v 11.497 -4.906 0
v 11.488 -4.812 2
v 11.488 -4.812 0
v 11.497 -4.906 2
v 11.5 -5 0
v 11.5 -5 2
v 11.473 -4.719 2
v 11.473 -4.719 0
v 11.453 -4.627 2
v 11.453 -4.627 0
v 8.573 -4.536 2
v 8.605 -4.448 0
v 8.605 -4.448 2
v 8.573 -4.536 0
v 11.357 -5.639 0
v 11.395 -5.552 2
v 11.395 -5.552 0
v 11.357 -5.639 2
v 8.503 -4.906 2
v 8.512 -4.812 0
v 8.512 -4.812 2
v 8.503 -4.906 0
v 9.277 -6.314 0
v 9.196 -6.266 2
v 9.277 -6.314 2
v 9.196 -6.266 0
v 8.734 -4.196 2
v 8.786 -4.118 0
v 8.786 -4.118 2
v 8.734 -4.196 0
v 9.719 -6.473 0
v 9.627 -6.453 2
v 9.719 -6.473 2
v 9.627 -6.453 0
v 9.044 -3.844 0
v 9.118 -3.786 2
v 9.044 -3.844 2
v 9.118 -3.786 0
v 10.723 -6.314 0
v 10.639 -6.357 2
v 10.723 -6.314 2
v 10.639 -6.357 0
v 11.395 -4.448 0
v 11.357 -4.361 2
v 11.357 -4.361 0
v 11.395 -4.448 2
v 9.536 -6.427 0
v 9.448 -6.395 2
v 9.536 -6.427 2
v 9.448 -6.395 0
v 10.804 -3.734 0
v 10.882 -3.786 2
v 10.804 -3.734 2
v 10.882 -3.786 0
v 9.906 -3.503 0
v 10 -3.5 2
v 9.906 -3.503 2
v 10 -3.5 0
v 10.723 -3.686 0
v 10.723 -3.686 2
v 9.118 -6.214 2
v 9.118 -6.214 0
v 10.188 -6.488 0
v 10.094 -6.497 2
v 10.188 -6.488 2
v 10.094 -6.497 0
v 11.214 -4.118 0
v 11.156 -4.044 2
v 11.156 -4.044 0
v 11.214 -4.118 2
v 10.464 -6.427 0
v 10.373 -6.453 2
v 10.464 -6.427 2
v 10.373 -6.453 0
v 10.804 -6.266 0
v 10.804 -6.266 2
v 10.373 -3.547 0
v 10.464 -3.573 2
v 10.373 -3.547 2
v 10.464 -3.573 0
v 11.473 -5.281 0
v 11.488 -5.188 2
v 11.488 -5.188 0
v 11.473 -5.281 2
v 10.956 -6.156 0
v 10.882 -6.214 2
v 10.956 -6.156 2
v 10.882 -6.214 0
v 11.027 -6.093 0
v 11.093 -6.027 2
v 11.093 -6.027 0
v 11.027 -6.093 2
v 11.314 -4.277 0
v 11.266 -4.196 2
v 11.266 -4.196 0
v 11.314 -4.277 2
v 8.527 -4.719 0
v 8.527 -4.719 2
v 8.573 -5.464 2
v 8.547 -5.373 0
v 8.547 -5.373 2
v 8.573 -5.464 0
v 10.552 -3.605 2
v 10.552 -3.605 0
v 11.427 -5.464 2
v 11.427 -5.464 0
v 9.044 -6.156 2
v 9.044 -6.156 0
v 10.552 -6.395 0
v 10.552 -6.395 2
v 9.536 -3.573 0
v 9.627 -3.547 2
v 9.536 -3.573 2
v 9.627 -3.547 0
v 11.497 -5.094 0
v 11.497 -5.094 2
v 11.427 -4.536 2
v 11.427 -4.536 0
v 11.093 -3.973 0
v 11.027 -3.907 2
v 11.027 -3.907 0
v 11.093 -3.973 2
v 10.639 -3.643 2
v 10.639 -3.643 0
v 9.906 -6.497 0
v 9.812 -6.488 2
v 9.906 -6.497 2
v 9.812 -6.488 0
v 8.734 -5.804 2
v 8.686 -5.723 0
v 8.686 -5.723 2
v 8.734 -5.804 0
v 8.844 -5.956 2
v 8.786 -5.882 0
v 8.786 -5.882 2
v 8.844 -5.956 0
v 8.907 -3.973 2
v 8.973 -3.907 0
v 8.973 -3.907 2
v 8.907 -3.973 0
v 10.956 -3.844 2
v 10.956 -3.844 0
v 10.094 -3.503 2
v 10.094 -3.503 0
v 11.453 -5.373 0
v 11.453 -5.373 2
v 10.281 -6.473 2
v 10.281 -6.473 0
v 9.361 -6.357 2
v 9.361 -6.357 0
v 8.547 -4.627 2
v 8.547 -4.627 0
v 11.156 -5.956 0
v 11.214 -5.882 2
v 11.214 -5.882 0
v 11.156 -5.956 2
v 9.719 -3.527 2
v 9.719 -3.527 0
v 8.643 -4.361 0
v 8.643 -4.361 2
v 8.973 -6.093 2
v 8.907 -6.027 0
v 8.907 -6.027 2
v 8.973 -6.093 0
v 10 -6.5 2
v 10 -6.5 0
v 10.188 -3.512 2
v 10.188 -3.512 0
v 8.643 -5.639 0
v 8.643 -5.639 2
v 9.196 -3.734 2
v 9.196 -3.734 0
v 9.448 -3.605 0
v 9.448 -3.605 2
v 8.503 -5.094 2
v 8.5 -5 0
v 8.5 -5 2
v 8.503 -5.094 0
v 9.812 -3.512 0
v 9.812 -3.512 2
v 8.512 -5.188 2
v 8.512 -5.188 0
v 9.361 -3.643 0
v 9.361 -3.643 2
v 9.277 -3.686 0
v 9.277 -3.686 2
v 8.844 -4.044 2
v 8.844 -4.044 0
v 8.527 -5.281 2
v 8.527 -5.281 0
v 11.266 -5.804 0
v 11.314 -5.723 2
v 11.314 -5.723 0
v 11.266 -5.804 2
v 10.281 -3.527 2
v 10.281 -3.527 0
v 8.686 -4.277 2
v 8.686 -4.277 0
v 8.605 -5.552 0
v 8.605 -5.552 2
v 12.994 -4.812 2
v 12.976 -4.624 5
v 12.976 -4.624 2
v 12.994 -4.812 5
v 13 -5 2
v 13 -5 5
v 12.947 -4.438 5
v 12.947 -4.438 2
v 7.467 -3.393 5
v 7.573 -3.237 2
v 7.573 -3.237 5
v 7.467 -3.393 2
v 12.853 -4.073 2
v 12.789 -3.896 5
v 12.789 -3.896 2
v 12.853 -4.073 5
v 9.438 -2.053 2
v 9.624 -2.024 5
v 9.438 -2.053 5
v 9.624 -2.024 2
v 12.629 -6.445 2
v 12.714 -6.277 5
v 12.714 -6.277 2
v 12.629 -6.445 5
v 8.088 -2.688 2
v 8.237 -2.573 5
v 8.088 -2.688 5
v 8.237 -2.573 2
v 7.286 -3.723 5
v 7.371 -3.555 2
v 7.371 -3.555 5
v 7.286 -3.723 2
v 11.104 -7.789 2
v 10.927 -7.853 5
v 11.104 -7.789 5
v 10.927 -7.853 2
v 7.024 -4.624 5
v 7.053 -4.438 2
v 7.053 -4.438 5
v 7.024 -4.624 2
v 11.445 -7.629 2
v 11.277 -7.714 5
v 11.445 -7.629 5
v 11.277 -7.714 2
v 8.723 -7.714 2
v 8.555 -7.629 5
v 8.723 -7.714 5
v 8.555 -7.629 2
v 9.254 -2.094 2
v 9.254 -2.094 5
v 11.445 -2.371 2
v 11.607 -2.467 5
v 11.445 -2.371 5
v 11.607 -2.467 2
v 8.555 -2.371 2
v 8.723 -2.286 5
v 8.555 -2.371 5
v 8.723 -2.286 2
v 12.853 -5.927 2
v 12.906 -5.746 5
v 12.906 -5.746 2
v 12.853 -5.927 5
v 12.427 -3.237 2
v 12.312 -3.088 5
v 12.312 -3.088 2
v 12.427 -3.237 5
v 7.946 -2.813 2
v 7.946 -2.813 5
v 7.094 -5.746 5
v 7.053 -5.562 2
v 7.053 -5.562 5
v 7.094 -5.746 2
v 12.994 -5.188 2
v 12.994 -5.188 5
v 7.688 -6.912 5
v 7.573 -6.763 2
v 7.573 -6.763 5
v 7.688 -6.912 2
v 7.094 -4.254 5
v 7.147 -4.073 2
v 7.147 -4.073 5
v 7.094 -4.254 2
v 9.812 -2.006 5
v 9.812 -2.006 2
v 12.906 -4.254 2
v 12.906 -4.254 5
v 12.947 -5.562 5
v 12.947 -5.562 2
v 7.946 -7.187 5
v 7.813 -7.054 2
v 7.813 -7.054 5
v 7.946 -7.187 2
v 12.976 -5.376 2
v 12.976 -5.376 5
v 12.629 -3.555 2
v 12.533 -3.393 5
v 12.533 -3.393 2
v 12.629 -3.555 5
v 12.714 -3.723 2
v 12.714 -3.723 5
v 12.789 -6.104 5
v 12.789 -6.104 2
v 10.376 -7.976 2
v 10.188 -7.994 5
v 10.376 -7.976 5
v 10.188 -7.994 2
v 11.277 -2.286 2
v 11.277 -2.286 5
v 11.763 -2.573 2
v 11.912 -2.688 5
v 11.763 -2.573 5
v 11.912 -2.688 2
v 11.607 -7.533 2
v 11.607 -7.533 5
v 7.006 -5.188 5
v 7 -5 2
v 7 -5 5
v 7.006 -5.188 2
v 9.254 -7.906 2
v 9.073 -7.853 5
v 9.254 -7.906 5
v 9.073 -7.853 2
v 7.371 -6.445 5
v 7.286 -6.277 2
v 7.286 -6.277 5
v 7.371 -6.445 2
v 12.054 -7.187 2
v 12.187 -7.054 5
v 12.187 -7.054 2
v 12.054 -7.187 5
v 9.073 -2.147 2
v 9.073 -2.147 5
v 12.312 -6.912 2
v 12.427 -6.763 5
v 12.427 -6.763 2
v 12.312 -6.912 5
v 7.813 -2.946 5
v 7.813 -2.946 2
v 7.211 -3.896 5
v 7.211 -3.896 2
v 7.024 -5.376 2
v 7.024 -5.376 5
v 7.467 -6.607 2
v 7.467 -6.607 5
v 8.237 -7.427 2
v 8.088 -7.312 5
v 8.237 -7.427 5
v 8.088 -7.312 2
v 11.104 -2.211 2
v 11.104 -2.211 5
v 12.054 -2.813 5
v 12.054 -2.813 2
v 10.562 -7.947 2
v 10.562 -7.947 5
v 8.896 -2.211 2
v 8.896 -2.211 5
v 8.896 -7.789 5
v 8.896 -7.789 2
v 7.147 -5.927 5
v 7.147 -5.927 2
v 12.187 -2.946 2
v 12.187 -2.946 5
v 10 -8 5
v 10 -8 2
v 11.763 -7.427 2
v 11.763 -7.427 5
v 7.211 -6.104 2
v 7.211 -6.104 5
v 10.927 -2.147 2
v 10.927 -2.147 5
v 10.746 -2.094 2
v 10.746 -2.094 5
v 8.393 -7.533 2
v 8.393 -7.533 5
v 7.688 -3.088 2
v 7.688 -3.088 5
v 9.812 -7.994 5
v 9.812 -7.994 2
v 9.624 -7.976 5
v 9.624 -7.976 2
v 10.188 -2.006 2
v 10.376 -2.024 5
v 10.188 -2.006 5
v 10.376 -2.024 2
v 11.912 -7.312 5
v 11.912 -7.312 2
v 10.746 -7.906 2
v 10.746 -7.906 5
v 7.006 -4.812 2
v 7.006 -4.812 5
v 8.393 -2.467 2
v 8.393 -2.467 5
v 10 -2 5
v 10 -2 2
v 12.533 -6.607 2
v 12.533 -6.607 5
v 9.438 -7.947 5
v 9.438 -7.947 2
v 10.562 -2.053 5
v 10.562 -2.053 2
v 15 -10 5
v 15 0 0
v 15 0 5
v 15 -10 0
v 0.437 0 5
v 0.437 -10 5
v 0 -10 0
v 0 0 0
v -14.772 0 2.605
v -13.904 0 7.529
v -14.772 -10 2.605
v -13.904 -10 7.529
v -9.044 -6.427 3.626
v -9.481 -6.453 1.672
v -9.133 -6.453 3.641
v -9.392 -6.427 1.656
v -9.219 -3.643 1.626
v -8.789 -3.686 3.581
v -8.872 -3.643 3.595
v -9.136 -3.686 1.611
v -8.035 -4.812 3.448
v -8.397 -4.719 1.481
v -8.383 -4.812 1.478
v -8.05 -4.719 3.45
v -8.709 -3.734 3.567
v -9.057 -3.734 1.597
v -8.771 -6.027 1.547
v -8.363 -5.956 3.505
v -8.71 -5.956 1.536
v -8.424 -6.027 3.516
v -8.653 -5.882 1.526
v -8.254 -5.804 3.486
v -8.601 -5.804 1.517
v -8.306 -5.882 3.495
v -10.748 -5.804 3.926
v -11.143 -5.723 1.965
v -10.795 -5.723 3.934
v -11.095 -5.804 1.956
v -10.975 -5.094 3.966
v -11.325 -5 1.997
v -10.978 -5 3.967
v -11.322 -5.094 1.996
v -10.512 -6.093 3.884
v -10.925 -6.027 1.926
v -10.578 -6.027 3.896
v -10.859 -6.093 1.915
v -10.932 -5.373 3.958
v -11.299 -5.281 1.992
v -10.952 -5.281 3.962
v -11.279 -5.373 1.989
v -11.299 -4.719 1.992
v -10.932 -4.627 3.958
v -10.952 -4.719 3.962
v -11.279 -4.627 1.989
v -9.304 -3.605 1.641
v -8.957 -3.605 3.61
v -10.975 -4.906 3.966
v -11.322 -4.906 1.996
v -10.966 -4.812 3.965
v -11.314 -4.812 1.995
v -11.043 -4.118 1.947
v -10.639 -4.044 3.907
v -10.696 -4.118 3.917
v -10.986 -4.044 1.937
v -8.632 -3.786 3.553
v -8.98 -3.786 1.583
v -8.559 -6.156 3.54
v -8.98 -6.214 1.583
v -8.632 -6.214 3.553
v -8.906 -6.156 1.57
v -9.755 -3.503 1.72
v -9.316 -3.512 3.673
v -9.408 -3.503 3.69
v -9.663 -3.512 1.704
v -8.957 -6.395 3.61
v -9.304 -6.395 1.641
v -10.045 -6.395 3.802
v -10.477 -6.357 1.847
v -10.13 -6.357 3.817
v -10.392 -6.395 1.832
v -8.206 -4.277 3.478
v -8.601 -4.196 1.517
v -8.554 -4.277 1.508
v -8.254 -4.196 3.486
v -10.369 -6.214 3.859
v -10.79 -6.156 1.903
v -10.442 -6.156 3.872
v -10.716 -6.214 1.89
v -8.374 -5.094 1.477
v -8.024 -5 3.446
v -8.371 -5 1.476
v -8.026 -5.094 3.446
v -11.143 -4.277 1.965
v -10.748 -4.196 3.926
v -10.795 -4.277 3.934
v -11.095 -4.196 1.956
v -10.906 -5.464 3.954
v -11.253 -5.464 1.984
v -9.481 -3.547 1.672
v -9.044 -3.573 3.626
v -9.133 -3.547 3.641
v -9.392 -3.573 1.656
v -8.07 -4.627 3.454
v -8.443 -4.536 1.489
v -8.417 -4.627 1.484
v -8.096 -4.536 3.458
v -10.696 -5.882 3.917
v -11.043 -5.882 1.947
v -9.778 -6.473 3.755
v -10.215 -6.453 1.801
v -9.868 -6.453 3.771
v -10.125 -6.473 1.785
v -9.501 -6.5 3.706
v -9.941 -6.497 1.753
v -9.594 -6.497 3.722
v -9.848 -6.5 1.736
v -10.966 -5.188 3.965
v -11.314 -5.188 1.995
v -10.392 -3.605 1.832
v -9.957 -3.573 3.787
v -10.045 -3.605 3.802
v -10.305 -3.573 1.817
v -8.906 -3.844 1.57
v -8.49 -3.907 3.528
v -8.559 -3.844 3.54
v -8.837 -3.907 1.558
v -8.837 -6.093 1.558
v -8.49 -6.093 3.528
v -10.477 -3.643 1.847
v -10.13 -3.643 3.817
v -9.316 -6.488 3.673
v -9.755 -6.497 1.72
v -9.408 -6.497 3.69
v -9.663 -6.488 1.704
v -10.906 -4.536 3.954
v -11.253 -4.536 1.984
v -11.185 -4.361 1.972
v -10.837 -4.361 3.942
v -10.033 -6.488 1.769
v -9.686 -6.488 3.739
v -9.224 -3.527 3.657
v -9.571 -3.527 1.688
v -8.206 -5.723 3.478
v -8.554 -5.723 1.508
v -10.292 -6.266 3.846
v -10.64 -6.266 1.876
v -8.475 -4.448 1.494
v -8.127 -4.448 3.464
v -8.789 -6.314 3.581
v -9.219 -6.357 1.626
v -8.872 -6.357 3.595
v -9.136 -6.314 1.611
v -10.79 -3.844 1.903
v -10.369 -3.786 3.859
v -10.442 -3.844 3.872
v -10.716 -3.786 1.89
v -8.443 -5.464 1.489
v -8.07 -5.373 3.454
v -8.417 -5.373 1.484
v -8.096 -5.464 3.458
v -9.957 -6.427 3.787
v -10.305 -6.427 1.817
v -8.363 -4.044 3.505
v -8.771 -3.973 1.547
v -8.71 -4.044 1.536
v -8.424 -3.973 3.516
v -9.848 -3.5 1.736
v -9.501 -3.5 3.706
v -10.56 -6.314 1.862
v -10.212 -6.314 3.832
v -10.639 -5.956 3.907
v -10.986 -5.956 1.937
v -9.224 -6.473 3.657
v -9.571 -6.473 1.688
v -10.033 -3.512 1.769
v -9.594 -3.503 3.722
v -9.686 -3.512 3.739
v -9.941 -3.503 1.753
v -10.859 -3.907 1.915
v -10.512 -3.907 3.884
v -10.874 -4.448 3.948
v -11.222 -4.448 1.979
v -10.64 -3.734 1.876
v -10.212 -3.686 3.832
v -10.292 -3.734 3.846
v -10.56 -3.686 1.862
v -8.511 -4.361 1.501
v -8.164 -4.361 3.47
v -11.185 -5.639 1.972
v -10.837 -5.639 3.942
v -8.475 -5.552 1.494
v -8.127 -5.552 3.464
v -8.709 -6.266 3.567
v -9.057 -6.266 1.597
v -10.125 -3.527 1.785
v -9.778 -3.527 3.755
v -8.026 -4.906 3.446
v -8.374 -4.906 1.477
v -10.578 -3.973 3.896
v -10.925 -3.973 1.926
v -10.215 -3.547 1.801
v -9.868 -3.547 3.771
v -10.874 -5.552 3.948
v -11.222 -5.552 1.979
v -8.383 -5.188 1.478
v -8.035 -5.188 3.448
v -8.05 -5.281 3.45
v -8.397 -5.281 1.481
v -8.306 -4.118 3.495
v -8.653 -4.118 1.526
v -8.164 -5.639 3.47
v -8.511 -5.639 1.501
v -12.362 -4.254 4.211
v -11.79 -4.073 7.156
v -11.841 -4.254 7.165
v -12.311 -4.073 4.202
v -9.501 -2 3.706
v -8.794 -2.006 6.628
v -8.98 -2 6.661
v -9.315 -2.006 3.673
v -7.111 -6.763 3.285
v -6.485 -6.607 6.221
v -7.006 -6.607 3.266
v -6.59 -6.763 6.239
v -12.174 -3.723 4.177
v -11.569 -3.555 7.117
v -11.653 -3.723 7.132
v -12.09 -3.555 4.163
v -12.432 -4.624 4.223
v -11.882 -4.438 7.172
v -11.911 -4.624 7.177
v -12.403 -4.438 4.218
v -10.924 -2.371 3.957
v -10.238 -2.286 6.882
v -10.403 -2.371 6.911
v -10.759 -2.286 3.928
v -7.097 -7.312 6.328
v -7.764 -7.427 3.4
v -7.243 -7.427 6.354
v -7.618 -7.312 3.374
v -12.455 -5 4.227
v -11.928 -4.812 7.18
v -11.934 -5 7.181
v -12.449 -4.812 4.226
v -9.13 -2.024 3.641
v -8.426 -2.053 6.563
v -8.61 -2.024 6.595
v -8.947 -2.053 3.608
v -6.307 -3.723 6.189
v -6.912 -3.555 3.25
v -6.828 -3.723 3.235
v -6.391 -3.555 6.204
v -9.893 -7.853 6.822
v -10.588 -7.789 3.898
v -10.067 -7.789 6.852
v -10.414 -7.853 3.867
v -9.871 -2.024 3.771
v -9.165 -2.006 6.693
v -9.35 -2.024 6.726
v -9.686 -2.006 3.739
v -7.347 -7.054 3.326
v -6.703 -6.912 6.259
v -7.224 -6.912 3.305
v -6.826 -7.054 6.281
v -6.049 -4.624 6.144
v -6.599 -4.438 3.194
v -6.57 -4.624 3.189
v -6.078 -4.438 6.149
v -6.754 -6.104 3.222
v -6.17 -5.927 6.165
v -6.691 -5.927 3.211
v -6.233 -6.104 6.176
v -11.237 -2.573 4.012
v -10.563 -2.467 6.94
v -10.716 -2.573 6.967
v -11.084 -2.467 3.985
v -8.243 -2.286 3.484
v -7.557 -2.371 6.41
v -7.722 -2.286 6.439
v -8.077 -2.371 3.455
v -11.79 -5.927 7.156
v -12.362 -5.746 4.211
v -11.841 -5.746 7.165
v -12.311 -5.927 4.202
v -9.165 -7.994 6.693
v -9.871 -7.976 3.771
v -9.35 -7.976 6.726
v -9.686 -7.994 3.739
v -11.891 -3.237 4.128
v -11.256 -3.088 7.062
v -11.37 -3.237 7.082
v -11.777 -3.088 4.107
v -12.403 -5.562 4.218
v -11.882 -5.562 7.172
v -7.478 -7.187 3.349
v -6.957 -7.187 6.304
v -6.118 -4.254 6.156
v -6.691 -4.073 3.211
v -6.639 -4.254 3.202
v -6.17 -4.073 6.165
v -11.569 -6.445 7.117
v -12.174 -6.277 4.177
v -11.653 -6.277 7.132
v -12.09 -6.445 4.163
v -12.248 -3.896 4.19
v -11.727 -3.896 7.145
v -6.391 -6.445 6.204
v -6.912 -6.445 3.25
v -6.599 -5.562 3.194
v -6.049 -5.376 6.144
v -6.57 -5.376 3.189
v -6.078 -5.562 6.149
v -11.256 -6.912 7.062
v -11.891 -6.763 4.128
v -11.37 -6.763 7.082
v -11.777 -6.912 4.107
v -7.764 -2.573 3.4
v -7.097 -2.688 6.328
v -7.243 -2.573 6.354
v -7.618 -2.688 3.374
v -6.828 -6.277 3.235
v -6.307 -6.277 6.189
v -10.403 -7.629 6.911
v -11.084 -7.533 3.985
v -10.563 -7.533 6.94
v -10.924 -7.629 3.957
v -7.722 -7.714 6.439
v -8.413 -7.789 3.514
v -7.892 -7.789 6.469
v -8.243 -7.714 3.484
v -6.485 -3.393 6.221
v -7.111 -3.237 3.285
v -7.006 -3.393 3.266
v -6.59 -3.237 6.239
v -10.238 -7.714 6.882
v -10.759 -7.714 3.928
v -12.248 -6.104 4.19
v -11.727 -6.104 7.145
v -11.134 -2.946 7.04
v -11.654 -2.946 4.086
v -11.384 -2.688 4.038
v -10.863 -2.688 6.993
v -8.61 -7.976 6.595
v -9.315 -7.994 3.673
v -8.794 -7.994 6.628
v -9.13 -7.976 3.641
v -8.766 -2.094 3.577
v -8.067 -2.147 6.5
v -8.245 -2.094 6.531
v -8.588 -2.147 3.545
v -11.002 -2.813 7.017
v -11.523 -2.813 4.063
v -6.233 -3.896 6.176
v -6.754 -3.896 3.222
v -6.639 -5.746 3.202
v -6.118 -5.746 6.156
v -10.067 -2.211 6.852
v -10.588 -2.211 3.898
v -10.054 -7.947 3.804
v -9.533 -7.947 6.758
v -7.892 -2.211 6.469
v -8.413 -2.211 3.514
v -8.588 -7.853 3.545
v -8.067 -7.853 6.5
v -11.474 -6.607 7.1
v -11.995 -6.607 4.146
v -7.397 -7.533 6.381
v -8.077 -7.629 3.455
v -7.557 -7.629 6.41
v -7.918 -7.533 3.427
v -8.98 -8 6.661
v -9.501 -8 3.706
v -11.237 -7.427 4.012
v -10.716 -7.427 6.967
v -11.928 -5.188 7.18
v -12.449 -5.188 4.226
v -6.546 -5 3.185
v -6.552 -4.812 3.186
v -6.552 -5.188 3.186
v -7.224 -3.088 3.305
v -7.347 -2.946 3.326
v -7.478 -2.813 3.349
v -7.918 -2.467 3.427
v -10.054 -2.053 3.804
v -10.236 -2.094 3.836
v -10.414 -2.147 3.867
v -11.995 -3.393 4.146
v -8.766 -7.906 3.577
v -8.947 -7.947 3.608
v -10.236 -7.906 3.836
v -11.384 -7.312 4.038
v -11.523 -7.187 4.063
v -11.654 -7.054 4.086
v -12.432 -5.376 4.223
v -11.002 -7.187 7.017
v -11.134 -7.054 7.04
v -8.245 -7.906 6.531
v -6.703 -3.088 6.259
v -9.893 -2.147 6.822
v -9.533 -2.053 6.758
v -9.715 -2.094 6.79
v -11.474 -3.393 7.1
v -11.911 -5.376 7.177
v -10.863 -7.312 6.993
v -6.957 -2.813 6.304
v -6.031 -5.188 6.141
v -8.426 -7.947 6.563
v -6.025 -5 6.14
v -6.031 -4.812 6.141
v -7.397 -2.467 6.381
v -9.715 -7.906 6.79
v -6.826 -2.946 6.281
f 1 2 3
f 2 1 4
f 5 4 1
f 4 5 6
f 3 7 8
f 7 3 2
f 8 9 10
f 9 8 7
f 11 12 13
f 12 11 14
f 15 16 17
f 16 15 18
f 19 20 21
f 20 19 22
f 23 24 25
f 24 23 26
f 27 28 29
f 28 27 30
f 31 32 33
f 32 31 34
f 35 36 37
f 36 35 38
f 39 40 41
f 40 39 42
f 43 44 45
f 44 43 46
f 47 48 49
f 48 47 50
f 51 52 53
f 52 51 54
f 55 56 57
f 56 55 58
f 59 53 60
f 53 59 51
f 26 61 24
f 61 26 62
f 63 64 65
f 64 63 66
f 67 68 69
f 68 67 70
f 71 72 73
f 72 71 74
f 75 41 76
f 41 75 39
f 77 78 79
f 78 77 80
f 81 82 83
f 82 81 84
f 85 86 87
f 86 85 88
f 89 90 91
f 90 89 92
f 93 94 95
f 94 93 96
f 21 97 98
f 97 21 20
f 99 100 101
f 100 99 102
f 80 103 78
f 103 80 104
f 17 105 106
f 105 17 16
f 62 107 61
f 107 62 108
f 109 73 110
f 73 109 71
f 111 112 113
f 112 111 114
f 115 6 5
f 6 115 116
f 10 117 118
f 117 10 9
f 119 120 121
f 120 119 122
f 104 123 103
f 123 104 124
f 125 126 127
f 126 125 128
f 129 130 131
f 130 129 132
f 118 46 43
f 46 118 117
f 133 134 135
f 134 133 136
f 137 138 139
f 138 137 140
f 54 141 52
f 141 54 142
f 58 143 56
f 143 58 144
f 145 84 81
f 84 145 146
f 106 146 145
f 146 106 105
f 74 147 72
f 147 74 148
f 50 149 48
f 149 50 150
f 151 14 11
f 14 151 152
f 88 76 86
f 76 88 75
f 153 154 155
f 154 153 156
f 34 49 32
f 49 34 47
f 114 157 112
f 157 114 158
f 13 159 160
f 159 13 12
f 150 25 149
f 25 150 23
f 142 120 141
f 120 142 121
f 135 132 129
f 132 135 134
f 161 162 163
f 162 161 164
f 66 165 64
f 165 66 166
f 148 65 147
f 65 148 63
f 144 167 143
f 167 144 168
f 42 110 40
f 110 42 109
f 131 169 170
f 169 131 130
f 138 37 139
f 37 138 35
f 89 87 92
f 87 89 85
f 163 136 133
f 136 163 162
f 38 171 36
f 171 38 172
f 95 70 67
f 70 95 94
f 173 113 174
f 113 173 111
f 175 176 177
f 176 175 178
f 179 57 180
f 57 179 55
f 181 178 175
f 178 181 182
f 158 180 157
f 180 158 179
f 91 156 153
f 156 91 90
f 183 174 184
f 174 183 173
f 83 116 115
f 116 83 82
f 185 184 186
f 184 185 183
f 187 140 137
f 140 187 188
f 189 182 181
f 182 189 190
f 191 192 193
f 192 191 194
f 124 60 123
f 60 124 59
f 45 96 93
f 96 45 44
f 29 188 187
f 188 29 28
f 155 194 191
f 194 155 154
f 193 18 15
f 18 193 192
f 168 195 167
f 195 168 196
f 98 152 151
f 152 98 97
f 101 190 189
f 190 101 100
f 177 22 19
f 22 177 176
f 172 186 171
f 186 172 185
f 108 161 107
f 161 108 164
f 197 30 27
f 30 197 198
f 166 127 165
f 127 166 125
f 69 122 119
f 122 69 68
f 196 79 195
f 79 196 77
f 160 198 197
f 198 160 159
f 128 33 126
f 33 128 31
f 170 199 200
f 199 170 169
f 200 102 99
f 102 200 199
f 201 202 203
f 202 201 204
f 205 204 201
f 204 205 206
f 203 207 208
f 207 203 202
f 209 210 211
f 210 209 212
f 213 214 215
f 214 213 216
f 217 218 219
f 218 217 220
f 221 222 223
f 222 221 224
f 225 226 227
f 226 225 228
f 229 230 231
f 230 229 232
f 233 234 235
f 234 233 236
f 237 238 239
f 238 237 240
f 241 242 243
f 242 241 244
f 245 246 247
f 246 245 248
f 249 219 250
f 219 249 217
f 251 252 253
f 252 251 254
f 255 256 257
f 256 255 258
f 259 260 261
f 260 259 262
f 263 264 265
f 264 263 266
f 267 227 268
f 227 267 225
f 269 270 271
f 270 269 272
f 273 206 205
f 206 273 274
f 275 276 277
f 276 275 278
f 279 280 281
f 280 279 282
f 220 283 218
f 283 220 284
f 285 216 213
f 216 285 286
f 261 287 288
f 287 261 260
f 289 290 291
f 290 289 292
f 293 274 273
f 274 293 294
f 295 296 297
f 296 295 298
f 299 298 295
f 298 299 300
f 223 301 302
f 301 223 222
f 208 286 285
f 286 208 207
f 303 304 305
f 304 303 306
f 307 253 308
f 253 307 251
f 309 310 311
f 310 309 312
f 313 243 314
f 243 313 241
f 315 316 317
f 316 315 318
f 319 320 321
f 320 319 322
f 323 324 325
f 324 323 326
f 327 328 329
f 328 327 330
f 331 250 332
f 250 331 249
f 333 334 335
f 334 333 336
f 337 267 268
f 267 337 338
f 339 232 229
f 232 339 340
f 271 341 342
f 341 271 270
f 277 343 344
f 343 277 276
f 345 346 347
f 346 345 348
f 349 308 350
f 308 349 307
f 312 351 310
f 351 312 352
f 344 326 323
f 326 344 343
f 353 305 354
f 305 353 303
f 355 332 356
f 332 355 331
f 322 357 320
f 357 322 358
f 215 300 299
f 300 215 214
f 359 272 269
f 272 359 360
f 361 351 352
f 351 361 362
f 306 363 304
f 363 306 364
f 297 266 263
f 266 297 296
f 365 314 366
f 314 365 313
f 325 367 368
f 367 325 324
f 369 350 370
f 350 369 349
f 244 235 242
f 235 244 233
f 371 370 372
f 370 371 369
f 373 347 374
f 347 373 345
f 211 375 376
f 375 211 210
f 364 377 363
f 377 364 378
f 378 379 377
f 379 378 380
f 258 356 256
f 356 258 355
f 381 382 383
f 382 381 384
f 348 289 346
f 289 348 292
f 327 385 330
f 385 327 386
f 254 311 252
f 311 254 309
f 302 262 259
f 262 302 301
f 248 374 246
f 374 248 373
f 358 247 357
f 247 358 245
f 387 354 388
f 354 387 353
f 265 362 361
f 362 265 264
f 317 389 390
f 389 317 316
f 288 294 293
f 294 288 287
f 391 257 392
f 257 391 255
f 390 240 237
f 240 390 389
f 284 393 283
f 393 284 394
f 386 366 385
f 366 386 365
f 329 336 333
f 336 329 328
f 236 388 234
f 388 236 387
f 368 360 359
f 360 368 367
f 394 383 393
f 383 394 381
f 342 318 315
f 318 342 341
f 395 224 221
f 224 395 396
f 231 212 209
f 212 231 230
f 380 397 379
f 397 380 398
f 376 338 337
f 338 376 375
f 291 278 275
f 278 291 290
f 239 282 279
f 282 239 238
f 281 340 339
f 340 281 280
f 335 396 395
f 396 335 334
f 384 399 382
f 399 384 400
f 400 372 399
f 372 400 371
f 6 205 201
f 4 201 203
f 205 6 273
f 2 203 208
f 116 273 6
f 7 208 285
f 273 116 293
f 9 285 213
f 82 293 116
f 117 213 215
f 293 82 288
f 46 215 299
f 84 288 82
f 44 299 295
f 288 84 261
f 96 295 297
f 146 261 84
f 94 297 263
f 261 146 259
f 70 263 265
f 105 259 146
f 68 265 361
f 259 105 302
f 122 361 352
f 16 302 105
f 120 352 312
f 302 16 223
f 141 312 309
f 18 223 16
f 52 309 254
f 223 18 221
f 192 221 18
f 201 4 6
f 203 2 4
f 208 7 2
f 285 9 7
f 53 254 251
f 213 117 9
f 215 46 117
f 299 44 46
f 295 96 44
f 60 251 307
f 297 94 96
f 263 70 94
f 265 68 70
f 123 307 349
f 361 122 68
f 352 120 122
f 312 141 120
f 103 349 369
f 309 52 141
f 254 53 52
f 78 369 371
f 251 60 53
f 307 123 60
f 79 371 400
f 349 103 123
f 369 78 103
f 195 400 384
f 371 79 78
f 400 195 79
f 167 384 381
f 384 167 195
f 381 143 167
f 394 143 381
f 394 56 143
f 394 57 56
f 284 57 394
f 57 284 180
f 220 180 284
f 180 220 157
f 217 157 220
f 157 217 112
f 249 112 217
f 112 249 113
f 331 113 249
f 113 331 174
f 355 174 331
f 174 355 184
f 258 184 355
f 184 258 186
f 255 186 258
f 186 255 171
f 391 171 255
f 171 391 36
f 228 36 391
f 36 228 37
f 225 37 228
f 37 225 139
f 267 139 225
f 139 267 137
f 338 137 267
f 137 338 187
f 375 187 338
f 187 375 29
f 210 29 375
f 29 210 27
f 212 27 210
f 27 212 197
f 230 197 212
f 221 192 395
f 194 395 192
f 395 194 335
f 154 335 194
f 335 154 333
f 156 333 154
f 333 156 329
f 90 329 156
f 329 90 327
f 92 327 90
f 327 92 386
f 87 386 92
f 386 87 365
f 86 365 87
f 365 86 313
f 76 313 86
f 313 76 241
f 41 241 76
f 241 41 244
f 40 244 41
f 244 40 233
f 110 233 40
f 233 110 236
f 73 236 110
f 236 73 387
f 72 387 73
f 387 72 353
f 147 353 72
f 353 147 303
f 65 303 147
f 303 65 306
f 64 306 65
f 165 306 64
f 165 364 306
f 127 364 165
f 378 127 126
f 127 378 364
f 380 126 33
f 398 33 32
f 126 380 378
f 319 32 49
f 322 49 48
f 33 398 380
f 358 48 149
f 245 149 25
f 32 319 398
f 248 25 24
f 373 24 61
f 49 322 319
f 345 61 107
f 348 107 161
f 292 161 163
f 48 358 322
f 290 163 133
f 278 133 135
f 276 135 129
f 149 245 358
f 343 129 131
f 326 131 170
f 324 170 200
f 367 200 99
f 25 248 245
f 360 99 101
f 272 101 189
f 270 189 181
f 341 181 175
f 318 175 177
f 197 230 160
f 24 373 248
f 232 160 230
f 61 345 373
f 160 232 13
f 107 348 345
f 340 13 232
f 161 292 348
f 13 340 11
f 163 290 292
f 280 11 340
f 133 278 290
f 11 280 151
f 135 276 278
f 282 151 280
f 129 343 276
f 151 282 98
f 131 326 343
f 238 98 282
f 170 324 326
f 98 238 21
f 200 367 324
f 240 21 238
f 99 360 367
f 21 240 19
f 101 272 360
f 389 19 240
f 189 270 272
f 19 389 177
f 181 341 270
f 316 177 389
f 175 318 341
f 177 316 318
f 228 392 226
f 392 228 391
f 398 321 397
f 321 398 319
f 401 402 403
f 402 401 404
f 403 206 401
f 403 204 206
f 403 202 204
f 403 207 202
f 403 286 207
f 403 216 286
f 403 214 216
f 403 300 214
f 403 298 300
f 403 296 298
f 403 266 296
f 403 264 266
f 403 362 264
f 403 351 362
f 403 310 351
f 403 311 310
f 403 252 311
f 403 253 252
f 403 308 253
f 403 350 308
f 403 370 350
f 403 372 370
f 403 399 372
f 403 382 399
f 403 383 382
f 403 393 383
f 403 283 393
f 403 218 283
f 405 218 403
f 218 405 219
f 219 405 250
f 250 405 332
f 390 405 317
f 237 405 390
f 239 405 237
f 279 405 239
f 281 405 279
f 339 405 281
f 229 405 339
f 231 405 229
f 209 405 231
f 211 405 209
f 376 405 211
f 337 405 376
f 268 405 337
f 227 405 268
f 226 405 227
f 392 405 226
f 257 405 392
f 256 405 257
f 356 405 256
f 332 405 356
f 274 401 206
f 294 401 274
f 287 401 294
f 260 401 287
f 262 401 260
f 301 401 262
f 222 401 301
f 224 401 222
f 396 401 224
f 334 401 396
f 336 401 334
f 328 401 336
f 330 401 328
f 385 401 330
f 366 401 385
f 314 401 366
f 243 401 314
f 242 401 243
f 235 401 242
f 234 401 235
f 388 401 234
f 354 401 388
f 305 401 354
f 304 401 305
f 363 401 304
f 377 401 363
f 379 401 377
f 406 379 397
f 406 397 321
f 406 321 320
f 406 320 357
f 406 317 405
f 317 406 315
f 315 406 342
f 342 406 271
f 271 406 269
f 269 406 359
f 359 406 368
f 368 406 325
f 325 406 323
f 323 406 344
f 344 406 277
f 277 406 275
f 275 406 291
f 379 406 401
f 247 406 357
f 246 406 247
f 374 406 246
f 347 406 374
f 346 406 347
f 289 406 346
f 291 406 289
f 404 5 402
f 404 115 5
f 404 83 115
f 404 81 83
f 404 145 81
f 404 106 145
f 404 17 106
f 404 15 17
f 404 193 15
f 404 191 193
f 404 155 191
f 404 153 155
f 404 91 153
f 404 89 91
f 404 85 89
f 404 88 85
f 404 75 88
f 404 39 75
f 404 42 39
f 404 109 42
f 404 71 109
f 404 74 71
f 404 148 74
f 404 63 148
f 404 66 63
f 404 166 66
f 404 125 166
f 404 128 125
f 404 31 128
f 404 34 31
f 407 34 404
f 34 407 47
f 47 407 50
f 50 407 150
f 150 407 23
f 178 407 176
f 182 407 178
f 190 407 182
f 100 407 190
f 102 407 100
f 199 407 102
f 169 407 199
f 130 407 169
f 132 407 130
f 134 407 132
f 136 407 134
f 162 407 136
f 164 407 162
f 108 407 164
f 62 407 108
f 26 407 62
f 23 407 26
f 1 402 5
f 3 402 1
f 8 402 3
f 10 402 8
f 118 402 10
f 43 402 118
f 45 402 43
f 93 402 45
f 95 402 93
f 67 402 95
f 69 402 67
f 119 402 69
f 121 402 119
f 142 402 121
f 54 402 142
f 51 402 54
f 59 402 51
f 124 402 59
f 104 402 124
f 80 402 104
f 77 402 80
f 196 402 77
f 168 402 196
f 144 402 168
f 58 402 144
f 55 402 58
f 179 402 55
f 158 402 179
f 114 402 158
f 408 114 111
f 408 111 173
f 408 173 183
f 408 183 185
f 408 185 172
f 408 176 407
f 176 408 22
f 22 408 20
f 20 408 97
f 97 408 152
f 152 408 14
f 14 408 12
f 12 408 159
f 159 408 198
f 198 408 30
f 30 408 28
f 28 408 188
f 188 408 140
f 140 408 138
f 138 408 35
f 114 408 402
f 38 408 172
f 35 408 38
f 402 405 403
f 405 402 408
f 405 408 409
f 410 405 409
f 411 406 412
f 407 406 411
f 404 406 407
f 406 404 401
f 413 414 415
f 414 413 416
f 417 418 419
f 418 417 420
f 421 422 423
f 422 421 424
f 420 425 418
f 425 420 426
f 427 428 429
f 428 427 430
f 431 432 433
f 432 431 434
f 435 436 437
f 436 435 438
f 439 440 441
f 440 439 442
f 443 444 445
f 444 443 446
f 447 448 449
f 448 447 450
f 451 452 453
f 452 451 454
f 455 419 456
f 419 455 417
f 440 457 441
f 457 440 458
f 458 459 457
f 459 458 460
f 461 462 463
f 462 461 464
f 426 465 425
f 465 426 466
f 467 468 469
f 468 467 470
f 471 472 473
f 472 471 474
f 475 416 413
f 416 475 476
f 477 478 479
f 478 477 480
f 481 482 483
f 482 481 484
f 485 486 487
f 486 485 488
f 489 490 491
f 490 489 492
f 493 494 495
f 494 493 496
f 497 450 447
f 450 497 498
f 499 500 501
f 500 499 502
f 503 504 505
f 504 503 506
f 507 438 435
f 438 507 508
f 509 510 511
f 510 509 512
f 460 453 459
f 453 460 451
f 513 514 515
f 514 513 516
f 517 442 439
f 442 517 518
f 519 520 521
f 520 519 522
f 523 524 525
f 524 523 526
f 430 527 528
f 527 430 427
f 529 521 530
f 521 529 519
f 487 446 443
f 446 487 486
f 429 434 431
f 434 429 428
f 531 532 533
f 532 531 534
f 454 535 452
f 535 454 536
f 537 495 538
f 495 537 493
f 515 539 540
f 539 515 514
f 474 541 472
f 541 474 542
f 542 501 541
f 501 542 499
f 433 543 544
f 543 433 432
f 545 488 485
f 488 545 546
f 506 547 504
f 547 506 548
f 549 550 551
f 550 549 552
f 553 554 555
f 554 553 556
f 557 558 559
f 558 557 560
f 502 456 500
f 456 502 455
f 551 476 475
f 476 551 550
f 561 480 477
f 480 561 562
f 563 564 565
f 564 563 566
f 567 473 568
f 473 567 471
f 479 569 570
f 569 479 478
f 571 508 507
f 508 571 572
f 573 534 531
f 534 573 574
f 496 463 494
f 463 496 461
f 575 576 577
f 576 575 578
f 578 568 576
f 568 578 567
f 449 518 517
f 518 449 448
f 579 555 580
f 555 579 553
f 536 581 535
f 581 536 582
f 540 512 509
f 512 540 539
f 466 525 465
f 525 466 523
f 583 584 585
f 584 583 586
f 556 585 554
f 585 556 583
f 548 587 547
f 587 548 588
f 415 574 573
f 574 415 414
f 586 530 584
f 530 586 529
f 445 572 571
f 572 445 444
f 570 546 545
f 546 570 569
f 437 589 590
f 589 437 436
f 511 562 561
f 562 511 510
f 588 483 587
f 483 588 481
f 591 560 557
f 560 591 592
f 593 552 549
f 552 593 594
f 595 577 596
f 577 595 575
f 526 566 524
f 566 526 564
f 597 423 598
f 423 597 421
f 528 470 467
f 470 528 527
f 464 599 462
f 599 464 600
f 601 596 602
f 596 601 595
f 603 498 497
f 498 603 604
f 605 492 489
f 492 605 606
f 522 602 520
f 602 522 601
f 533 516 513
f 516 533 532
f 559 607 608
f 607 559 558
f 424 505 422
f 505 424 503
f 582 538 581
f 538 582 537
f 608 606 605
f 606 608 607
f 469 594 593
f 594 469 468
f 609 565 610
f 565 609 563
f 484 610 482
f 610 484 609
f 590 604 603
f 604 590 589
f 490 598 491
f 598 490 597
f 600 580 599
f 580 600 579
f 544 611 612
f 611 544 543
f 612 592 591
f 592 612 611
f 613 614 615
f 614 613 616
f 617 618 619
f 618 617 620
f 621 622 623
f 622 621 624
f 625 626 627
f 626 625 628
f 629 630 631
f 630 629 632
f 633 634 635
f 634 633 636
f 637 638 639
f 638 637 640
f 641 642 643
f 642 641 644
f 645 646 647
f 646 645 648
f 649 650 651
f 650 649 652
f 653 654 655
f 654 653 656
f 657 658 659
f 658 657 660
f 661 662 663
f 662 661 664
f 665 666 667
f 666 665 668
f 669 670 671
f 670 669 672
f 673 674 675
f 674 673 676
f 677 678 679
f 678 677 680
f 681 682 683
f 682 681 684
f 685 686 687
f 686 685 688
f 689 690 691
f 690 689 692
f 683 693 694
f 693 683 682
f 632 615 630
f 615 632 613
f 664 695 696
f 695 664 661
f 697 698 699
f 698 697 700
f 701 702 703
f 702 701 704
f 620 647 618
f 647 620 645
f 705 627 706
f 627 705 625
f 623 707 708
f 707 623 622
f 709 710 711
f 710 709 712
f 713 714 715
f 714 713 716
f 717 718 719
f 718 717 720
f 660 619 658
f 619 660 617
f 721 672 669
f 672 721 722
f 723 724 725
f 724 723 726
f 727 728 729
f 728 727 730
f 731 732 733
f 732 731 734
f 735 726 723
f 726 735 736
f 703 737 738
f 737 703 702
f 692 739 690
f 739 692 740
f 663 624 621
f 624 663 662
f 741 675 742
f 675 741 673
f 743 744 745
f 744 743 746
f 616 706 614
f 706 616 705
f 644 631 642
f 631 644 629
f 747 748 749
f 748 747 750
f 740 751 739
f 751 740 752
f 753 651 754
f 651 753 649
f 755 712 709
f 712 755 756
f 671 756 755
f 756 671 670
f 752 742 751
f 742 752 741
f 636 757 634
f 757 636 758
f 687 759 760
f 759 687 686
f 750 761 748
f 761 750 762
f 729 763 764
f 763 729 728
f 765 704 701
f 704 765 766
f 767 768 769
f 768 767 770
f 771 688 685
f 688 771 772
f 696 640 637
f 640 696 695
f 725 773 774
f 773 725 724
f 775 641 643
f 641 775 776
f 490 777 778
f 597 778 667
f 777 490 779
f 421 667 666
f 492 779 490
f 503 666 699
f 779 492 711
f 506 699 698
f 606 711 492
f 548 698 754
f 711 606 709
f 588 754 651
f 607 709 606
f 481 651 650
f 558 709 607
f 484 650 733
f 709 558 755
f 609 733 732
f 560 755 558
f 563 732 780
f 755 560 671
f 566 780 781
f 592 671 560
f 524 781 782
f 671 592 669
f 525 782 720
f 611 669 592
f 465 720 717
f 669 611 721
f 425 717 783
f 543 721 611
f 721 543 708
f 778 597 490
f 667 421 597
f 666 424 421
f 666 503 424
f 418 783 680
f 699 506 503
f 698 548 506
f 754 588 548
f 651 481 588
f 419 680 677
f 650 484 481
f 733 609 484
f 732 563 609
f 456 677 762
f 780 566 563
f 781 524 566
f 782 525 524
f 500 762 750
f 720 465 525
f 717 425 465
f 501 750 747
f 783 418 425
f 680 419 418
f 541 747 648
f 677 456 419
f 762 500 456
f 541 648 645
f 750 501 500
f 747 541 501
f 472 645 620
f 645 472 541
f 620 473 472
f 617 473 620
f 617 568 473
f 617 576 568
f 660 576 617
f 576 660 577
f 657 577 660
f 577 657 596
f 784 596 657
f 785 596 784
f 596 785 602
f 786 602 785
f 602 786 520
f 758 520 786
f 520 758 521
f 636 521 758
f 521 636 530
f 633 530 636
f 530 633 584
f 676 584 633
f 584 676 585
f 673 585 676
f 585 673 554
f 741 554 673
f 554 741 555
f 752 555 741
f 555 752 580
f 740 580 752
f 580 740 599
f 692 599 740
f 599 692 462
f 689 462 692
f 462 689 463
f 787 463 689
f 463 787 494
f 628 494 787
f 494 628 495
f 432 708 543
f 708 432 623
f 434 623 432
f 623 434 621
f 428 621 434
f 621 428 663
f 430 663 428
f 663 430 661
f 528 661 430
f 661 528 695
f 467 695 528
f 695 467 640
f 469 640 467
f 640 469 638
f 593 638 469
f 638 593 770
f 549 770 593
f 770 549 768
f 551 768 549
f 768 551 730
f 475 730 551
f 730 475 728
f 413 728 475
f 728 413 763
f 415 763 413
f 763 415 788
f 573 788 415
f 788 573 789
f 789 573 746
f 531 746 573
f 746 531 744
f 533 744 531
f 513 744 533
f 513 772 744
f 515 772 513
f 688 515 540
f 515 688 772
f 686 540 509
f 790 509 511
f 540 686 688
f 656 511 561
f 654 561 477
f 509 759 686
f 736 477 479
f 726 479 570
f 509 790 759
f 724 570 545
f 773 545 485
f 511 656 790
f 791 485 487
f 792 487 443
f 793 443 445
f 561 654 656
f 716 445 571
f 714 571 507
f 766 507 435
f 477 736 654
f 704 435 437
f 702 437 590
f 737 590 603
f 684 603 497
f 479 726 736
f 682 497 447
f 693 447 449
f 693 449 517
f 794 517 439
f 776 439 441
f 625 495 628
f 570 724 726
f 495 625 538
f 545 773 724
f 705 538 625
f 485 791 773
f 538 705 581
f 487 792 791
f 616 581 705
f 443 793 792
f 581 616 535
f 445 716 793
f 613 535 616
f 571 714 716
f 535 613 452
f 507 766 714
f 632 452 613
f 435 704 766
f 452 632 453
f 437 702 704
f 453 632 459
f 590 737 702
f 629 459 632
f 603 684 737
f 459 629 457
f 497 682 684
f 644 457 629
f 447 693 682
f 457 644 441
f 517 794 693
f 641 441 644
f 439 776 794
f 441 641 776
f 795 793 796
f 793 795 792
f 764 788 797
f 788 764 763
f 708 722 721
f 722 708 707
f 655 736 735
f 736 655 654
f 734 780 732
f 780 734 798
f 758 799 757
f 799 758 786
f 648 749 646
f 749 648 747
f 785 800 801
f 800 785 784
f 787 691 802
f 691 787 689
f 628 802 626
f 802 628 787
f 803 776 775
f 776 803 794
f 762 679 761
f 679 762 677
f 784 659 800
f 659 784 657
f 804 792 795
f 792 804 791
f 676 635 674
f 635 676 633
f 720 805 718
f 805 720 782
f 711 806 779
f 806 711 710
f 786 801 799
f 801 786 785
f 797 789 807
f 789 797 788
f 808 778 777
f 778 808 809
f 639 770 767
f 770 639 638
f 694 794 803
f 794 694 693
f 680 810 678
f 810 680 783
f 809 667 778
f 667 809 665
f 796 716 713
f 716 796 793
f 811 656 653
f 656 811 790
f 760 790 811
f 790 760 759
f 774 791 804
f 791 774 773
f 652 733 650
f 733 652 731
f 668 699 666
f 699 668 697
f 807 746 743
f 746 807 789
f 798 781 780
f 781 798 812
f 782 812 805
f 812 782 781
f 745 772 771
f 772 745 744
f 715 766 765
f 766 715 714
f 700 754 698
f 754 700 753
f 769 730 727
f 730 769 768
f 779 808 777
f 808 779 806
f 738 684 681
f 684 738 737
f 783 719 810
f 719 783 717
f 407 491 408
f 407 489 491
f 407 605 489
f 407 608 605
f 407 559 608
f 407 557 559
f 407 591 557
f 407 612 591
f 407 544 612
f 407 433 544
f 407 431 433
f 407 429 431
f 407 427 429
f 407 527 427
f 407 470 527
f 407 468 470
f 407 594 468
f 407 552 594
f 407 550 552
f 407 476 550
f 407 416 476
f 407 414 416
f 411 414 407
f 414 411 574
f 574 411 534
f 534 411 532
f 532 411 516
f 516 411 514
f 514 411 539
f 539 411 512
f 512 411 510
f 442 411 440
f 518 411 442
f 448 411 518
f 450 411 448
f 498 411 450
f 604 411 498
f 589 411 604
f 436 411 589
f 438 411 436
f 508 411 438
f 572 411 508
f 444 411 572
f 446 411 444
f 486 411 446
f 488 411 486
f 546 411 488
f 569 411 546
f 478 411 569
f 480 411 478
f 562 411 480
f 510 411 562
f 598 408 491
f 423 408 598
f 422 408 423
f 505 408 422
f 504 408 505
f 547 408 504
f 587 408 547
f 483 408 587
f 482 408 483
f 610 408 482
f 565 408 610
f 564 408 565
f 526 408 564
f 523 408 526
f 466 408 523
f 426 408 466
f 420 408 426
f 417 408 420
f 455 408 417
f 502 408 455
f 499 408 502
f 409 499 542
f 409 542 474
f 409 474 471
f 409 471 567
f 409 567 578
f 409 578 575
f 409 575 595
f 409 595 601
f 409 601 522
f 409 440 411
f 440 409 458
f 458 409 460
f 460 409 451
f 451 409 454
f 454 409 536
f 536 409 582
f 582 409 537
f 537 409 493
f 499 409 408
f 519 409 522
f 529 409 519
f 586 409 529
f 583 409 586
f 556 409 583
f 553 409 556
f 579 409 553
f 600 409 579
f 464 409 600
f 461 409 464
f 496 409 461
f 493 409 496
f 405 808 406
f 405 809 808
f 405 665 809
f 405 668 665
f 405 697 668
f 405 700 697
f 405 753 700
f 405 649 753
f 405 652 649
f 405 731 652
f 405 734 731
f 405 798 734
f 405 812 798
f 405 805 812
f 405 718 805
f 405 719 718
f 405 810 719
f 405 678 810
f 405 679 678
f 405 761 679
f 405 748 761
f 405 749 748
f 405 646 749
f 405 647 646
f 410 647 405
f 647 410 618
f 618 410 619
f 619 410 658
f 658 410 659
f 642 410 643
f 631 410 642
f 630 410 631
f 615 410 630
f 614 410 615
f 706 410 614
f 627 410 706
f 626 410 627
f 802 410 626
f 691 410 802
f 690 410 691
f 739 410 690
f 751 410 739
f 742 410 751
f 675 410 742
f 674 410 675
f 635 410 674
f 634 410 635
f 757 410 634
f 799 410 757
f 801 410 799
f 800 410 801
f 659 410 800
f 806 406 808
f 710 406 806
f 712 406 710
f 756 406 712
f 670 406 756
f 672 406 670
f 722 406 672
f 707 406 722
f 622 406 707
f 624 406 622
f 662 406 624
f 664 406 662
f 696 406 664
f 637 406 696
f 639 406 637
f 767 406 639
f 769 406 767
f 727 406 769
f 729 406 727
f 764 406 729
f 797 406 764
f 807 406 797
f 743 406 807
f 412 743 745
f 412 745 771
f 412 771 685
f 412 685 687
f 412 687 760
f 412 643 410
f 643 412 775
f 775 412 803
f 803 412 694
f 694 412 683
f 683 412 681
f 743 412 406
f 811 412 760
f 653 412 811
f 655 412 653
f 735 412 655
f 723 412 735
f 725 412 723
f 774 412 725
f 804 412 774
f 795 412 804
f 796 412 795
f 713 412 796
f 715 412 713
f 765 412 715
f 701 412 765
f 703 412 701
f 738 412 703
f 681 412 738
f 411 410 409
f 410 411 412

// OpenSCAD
// ************* Credits part *************
// "Fixing customize w" 
// Programmed by Rudy RUFFEL - Decembre 2014
// Optimized for Customizer makerbot
//
//
//********************** License ******************
//**         "Fixing customize" by rr2s          **
//**  is licensed under the Creative Commons     **
//** - Attribution - Non-Commercial license.     **
//*************************************************
//
//
// ************* Declaration part *************

/* [Dimensions] */ 
// (Width this number will be multiplied by the number of screws on height (in mm). Example : if you specify 15mm and there are two screws on height, the total height will be 30mm. The thickness of wall is proportional to the width if you indicates a width 15mm  the thickness will  5mm. But you can change if you wantt hickness in tab)
Width         = 15;       
// (Length of fixing this number will multipier by the number of screw on length (in mm). Example : if you specify 10 and there are two screws on length, the total length will be 20.)
Height        = 10;
// Angle is 60 °. It can not be over because the screws not spend mounting. You can choose an angle between 90 ° and 0 °.
angle = 10;


/* [screw] */
// (number of height screw, if you want one screw.)
NumberOfScrewHeight  = 1;
// (number of width screw)
NumberOfScrewWidth = 1  ; 
// (diameter of screw) 
DiametreScrew = 3;        
// (screw head diameter of generally 2 times the diameter of the screw. Attention ! Check that the width and height is supperior in diameter screws.)
DiametreHeadScrew = 6;
// (Height of the screw head, if you want that screw is flush chose 0. Attention ! Check that the width and height is supperior in diameter screws.)
HeightHeadScrew   = 3;
// (Resolution of screws)
ResolutionScrew=100; //[20:Draft,50:Medium,100:Fine, 200:Very fine]
	RS = ResolutionScrew;
// (Creates a hex or cylindrical head screws)
ResolutionHeadScrew=100; //[6:Bolt (hex),20:Draft,50:Medium,100:Fine, 200:Very fine]
	RH = ResolutionHeadScrew;


/* [Thickness] */
//(Thickness Wall is normaly proportional to the width (Width/3) if ThicknessWall = 0. But you can change if you want. Attention ! Check that the Thickness Wall is supperior at HeightHeadScrew.the dimention is in mm)
ThicknessWall = 0;



// ************* private variable *************
	//TH = Width/3;  //  ThicknessWall base if ThicknessWall = 0
	TH= ThicknessWall == 0  ? Width/3 : ThicknessWall;
	W = Width;     // Simplifying the Variable : Width 
	H = Height;    // Simplifying the Variable : Height
    NbScrew = NumberOfScrewHeight -1; // Simplifying the Variable : NumberOfScrewHeight
	rScrew = DiametreScrew/2;      // radius of the screw
	CWS = TH+((W-TH)/2); // centering the screw on width
	CHS = H/2; // centering the screw on Height
	rHScrew = DiametreHeadScrew/2;  //radius of the Head screw
	HHS = HeightHeadScrew; // Simplifying the Variable : HeightHeadScrew
	NbScrewWidth = NumberOfScrewWidth-1; // Simplifying the Variable :  NumberOfScrewWith


// ************* Executable part *************
union(){
    difference(){
        Base1();
        Cut();
    }

    rotate([0,angle-90,0])difference(){
        Base2();
        Cut();
    }
}



// ************* Module part simple screw *************

// Module de construction
module BaseVolume1(){
	for ( i = [0 : NbScrew] ){
		translate([0,(H*i)-H,0])  cube([W,H,TH]);
		}
}

// Module de construction
module BaseVolume2(){
	for ( i = [0 : NbScrew] ){
		translate([TH,(H*i)-H,0]) rotate([0,-90,0]) cube([W,H,TH]);
		}
}

module BaseScrew(){
	for ( i = [0 : NbScrew] ){
		translate([CWS,CHS+((i*H)-H),-W]) cylinder(W*2,rScrew,rScrew,$fn=RS);
		translate([W,CHS+((i*H)-H),CWS]) rotate([0,-90,0]) cylinder(W*2,rScrew,rScrew,$fn=RS);
	}
}

module BaseScrewHead(){
	for ( i = [0 : NbScrew] ){
		translate([CWS,CHS+((i*H)-H),TH-HHS]) cylinder(W*2,rHScrew,rHScrew,$fn=RH);
		translate([(W*2)+TH-HHS,CHS+((i*H)-H),CWS]) rotate([0,-90,0]) cylinder(W*2,rHScrew,rHScrew,$fn=RH);
	}
}

// ************* Module part multi-screw *************

 module BaseVolume1MultiScrew(){
	for ( e = [0 : NbScrewWidth] ){
		for ( i = [0 : NbScrew] ){
			union() {
			translate([(W-TH)*e+TH,(H*i)-H,0])cube([W-TH,H,TH]);
			}
		}
	}
}

 module BaseVolume2MultiScrew(){
	for ( e = [0 : NbScrewWidth] ){
		for ( i = [0 : NbScrew] ){
			union() {
			translate([TH,(H*i)-H,(W-TH)*e+TH]) rotate([0,-90,0]) cube([W-TH,H,TH]);
			}
		}
	}
}


module BaseScrewMulti(){
	for ( e = [0 : NbScrewWidth] ){
		for ( i = [0 : NbScrew] ){
			translate([CWS+((W-TH)*e),CHS+((i*H)-H),-W]) cylinder(W*2,rScrew,rScrew,$fn=RS);
			translate([W,CHS+((i*H)-H),CWS+(W-TH)*e]) rotate([0,-90,0]) cylinder(W*2,rScrew,rScrew,$fn=RS);
		}
	}
}


module BaseScrewHeadmulti(){
	for ( e = [0 : NbScrewWidth] ){
		for ( i = [0 : NbScrew] ){
			translate([CWS+((W-TH)*e),CHS+((i*H)-H),TH-HHS]) cylinder(W*2,rHScrew,rHScrew,$fn=RH);
			translate([(W*2)+TH-HHS,CHS+((i*H)-H),CWS+(W-TH)*e]) rotate([0,-90,0]) cylinder(W*2,rHScrew,rHScrew,$fn=RH);
		}
	}
}

// ************* Module grouping : base and cut  *************

// module of base
module Base1(){
        BaseVolume1();
		if (NbScrew > 0 || NbScrewWidth > 0) {
		BaseVolume1MultiScrew();
		}
}

// module of base
module Base2(){
		BaseVolume2();
		if (NbScrew > 0 || NbScrewWidth > 0) {
        BaseVolume2MultiScrew();   
		}
}



// module of cut
module Cut(){
	BaseScrew();
	BaseScrewHead();
 	if (NbScrew > 0 || NbScrewWidth > 0) {
	BaseScrewMulti();
	BaseScrewHeadmulti();
	}
}











